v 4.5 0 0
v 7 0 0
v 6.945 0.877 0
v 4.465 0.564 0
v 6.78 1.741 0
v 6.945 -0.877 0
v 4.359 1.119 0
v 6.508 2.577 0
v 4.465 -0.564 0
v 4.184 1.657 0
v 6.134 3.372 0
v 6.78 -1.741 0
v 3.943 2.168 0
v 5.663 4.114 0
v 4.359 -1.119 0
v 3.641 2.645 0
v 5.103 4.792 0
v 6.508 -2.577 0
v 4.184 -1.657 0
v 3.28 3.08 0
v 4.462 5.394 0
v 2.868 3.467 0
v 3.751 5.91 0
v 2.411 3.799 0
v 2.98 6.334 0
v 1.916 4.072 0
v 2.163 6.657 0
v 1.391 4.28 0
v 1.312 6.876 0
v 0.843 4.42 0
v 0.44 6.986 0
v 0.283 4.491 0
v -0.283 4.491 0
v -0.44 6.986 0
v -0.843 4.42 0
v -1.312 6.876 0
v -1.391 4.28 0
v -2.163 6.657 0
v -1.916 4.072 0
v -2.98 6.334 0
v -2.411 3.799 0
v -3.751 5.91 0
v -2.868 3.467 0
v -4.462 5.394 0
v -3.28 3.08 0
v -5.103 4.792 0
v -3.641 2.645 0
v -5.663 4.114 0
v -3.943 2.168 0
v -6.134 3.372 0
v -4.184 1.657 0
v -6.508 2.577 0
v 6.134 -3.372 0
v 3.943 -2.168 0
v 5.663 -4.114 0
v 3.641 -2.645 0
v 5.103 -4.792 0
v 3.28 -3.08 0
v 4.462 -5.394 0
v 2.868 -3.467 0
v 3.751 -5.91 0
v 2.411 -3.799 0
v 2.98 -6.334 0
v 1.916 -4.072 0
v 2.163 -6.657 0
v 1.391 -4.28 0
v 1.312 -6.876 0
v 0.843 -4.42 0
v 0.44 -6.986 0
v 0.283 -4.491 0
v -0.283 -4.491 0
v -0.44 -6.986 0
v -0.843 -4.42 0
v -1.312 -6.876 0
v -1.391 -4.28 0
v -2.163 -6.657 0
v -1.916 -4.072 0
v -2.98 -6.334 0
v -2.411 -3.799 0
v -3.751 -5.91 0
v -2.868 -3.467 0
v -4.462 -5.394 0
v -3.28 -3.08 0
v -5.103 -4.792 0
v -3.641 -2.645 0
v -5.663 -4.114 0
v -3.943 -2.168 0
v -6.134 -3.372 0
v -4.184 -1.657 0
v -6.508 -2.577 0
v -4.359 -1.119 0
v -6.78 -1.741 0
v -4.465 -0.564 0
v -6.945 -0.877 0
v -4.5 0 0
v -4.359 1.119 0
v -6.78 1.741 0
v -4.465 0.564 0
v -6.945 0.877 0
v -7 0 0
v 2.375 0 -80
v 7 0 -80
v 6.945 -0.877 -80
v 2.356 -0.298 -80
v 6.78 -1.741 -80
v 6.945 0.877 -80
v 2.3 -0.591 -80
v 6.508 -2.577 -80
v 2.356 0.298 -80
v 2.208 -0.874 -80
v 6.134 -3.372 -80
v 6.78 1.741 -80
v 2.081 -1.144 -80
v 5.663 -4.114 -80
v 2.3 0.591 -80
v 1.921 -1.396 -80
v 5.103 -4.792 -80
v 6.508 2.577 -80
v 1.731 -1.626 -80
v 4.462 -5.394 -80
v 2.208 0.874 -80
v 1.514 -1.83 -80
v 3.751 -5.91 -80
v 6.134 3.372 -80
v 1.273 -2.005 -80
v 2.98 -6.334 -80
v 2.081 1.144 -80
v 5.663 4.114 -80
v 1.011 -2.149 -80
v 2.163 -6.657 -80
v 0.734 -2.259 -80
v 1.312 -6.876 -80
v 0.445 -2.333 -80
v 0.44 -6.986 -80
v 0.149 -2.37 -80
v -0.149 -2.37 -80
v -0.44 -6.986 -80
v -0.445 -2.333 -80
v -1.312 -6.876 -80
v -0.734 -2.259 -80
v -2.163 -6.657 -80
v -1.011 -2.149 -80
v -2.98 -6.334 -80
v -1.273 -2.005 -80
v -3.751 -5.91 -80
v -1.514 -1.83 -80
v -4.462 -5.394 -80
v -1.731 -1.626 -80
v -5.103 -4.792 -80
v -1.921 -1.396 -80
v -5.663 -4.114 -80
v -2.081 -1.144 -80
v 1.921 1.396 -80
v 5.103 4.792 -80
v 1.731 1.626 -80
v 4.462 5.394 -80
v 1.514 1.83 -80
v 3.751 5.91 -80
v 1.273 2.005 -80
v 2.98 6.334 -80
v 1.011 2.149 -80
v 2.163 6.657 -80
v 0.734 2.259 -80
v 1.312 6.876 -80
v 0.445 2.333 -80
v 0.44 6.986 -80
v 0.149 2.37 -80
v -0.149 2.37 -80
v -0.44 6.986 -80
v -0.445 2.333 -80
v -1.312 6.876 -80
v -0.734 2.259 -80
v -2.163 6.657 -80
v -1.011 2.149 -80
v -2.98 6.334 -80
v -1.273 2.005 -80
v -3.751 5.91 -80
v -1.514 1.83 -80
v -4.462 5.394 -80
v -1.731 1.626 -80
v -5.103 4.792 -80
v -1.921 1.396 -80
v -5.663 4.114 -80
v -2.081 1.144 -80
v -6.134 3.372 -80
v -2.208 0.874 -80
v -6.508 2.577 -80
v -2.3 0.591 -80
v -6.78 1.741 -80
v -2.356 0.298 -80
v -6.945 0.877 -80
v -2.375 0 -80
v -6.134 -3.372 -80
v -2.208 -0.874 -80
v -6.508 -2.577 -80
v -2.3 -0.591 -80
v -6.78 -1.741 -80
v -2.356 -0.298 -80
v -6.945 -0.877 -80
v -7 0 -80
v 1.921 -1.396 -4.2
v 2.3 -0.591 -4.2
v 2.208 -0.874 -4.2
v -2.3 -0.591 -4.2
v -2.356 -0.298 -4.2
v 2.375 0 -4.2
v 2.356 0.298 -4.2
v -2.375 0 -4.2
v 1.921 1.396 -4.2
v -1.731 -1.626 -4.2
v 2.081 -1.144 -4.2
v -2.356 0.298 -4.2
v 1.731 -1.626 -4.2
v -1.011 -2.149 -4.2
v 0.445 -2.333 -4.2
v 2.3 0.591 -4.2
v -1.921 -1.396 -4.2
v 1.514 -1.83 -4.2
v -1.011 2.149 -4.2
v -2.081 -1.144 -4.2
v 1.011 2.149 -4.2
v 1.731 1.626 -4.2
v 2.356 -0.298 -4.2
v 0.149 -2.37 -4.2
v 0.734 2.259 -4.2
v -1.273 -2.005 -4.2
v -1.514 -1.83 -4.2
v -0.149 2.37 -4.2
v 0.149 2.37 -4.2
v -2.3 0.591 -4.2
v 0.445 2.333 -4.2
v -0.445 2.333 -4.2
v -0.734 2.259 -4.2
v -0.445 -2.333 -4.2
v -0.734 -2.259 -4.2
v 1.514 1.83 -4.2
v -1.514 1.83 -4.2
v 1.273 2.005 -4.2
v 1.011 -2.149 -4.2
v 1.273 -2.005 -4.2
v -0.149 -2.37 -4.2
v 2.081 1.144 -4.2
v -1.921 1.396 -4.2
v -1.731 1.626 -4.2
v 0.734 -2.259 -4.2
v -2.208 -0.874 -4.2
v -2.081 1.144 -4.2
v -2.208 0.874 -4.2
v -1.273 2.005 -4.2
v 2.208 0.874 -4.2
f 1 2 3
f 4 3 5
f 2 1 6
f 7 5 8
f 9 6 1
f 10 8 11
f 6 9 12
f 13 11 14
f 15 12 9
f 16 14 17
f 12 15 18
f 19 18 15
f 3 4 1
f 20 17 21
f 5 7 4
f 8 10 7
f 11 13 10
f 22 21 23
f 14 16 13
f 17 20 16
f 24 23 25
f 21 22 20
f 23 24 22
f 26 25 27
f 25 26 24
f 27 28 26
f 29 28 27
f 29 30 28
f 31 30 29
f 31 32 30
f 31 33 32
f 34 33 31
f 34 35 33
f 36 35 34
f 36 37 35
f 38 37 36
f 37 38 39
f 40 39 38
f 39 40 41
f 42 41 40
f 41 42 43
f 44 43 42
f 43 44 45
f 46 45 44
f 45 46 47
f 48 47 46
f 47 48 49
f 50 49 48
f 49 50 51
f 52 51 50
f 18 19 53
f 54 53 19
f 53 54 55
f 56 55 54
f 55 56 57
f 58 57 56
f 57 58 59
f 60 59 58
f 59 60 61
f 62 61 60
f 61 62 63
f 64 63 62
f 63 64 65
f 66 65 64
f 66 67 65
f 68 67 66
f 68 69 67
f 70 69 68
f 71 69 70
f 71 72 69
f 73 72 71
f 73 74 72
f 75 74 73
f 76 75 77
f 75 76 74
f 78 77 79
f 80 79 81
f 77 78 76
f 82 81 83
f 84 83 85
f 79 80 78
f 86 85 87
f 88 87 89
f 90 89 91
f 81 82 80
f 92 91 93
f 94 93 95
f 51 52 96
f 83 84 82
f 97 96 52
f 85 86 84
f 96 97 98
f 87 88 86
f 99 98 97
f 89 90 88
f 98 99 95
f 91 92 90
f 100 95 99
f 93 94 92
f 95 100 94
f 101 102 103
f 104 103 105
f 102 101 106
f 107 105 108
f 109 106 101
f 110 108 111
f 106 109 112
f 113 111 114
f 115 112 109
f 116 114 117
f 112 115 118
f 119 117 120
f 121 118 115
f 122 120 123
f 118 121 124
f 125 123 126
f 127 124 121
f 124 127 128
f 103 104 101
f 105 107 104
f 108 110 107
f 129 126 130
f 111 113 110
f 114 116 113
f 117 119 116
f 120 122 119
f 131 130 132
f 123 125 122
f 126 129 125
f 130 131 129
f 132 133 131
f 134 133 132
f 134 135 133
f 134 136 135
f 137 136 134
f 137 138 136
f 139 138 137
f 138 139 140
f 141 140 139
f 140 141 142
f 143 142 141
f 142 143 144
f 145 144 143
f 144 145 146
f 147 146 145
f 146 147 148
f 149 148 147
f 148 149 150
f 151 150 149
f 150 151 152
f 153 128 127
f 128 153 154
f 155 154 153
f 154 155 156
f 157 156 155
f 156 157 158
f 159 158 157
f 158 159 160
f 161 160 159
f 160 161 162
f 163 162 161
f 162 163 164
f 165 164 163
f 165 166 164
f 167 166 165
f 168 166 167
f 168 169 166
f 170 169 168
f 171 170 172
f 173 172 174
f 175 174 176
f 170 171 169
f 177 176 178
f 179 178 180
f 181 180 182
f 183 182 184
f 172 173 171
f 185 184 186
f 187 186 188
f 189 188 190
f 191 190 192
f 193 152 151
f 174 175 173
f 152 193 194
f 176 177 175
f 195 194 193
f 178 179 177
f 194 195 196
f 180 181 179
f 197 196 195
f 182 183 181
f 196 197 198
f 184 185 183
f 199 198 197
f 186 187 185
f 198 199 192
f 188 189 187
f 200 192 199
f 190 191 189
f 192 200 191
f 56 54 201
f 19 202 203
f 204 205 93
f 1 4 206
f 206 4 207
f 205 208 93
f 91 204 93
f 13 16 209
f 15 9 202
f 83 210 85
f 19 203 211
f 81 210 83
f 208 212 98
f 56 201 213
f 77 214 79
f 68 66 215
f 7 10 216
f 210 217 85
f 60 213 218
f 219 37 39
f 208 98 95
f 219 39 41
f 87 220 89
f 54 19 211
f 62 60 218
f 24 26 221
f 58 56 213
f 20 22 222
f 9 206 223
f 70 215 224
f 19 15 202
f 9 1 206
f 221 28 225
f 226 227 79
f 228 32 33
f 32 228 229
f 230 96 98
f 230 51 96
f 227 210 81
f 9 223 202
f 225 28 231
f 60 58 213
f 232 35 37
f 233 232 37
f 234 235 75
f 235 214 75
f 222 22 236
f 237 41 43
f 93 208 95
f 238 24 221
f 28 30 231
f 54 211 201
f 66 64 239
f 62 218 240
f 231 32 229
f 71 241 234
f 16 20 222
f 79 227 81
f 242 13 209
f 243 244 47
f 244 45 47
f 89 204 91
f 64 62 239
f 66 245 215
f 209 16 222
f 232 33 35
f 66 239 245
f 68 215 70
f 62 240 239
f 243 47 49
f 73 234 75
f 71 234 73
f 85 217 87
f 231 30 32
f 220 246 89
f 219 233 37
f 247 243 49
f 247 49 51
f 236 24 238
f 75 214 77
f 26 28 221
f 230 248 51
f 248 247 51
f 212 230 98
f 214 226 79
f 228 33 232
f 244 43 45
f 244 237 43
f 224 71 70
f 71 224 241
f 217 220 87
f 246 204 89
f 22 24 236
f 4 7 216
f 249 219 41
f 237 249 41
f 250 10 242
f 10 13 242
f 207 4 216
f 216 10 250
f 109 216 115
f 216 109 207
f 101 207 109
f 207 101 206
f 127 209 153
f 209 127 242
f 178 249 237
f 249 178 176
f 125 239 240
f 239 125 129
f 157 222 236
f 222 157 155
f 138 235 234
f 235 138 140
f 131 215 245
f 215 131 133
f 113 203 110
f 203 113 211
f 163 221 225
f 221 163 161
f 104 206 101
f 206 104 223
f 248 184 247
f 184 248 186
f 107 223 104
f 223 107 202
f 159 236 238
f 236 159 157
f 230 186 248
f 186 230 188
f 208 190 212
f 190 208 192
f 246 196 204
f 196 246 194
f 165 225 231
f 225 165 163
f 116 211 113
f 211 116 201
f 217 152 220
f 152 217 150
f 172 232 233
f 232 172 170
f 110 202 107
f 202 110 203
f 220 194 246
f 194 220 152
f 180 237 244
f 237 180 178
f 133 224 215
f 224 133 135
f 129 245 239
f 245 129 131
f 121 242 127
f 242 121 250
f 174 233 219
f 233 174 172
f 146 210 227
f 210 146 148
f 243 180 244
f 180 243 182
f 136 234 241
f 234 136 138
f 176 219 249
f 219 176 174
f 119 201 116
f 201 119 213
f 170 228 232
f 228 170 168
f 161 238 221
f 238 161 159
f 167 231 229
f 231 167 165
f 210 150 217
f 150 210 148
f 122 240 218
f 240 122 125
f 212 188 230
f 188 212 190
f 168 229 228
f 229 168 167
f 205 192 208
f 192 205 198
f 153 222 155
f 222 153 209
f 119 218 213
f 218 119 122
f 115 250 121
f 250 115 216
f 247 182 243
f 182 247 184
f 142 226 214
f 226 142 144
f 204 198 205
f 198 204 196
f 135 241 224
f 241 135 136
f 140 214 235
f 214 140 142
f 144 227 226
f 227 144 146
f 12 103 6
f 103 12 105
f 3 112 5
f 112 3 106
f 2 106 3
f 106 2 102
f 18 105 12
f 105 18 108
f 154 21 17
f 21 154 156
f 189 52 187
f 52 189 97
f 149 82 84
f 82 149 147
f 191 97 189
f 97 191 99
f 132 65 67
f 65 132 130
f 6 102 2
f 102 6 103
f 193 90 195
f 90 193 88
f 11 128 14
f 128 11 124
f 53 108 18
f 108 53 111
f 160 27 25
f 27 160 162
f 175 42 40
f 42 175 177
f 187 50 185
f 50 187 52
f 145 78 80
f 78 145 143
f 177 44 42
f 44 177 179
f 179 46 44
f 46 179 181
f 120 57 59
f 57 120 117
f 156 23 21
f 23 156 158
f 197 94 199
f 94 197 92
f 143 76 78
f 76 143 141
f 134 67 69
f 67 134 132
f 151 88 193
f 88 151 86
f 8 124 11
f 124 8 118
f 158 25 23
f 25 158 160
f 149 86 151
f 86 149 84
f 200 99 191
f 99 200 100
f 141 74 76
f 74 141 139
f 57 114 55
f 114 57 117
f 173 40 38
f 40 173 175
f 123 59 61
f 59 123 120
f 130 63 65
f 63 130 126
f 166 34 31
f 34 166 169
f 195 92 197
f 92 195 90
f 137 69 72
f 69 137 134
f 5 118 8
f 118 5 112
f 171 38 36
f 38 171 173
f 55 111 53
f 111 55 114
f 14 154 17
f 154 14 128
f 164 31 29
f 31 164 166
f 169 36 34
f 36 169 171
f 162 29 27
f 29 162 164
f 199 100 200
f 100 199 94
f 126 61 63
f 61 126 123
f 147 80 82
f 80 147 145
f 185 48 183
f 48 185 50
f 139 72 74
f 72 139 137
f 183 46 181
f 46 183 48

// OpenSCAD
$fn = 50;


difference() {
	union() {
		translate(v = [0, 0, -80.0000000000]) {
			cylinder(h = 80, r = 7.0000000000);
		}
		cylinder(h = 0, r = 10.0000000000);
	}
	union() {
		translate(v = [0, 0, 0]) {
			rotate(a = [0, 0, 0]) {
				difference() {
					union() {
						#translate(v = [0, 0, -80.0000000000]) {
							cylinder(h = 80, r = 2.2500000000);
						}
						#translate(v = [0, 0, -4.2000000000]) {
							cylinder(h = 4.2000000000, r1 = 2.3750000000, r2 = 4.5000000000);
						}
						#translate(v = [0, 0, -80.0000000000]) {
							cylinder(h = 80, r = 2.3750000000);
						}
						#translate(v = [0, 0, -80.0000000000]) {
							cylinder(h = 80, r = 2.2500000000);
						}
					}
					union();
				}
			}
		}
	}
}
